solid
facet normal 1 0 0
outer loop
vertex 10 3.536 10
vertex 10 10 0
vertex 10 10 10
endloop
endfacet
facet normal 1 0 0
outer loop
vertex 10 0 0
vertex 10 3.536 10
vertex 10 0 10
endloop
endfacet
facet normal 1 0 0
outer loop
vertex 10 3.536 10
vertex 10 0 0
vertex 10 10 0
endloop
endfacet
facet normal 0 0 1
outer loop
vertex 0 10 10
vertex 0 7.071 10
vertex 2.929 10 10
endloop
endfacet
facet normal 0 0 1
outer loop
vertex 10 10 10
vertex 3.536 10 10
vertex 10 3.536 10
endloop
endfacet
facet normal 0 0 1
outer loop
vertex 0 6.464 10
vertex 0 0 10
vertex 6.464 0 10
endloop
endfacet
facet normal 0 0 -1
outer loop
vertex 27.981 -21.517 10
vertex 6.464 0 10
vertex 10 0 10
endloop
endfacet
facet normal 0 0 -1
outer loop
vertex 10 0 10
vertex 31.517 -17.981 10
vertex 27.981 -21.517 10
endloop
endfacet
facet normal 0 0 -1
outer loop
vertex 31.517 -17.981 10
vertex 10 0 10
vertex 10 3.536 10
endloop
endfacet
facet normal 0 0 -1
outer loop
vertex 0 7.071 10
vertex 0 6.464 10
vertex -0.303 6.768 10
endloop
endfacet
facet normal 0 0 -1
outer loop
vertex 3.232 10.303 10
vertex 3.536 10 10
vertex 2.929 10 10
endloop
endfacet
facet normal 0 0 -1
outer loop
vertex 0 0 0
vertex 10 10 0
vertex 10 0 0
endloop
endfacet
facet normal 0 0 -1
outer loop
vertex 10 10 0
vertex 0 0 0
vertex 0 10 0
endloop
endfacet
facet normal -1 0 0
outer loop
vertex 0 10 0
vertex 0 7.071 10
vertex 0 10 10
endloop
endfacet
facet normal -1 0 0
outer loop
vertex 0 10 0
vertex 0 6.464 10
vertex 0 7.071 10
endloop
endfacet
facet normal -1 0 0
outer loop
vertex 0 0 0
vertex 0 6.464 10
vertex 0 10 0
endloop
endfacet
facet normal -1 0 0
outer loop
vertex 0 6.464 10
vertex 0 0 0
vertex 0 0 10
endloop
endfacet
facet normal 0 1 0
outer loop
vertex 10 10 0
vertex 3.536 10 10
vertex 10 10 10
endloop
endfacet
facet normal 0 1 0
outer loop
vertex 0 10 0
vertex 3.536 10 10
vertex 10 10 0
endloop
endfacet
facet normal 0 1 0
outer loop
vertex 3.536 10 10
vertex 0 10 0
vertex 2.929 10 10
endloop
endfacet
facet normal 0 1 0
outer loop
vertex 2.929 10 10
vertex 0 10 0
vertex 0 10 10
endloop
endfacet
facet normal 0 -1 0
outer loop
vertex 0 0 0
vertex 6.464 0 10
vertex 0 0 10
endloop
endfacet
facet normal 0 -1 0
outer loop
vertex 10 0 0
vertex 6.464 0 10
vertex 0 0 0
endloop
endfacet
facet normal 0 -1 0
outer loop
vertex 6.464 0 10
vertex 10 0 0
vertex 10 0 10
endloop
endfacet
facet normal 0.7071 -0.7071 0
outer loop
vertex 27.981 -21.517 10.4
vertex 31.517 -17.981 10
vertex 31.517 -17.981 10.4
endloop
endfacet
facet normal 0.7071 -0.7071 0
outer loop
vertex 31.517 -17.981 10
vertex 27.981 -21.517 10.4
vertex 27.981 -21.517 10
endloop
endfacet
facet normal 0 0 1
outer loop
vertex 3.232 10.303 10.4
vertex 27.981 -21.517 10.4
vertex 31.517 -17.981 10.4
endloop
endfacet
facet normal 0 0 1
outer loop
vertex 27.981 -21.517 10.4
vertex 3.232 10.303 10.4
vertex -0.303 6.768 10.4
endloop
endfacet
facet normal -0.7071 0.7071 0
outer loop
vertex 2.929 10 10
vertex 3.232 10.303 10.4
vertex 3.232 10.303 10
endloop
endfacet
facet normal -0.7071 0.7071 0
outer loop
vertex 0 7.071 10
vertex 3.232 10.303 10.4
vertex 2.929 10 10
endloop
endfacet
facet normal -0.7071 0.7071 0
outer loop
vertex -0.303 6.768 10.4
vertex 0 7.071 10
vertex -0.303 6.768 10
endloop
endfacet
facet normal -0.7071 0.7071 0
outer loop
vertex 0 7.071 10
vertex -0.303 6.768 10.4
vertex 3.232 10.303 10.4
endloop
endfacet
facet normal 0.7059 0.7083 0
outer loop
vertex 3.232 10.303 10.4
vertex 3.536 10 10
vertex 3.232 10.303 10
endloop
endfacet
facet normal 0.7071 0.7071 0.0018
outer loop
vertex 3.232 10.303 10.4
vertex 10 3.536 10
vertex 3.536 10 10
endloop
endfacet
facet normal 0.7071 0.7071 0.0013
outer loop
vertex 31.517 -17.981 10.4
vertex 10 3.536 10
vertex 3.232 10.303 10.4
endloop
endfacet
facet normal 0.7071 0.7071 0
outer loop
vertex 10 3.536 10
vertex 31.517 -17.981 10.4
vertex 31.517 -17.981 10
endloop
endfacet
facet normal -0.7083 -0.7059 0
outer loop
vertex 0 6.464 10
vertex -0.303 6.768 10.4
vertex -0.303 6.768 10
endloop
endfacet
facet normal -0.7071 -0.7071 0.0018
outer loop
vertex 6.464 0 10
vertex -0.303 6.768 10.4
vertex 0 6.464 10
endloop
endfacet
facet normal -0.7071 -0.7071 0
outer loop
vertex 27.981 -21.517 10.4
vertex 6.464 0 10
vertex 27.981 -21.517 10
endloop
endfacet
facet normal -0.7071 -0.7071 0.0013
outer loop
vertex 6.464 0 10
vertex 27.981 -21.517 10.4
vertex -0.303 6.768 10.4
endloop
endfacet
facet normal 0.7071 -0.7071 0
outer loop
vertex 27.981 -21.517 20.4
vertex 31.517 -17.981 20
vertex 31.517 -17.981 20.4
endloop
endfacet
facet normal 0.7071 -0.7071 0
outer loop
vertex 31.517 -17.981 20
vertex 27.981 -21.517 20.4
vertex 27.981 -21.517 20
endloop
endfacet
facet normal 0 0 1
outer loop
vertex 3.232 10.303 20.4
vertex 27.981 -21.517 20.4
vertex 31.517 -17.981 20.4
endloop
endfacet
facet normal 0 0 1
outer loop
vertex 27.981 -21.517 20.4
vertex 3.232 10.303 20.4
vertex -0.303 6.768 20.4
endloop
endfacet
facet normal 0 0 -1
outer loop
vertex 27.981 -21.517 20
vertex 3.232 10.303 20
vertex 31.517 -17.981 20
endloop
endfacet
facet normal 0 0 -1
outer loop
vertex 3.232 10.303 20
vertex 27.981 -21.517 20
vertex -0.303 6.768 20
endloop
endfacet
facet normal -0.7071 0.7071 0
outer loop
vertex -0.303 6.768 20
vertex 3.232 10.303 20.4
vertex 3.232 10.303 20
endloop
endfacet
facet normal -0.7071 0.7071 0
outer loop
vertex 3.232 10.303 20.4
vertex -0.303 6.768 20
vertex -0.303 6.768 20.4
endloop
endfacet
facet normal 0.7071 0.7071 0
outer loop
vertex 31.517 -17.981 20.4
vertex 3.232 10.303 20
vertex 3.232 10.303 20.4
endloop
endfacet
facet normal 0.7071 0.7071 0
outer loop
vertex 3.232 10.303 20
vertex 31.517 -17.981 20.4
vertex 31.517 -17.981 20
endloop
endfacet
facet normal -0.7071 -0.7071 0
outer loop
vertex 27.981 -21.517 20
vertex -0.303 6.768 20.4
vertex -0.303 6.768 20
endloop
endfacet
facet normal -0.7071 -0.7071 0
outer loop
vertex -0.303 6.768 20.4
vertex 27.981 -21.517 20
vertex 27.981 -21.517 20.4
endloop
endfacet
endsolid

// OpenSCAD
// file: local.scad
/*
Copyright (c) 2013 Johannes Reinhardt <jreinhardt@ist-dein-freund.de>

Permission is hereby granted, free of charge, to any person obtaining a copy
of this software and associated documentation files (the "Software"), to deal
in the Software without restriction, including without limitation the rights
to use, copy, modify, merge, publish, distribute, sublicense, and/or sell
copies of the Software, and to permit persons to whom the Software is
furnished to do so, subject to the following conditions:

The above copyright notice and this permission notice shall be included in
all copies or substantial portions of the Software.

THE SOFTWARE IS PROVIDED "AS IS", WITHOUT WARRANTY OF ANY KIND, EXPRESS OR
IMPLIED, INCLUDING BUT NOT LIMITED TO THE WARRANTIES OF MERCHANTABILITY,
FITNESS FOR A PARTICULAR PURPOSE AND NONINFRINGEMENT. IN NO EVENT SHALL THE
AUTHORS OR COPYRIGHT HOLDERS BE LIABLE FOR ANY CLAIM, DAMAGES OR OTHER
LIABILITY, WHETHER IN AN ACTION OF CONTRACT, TORT OR OTHERWISE, ARISING FROM,
OUT OF OR IN CONNECTION WITH THE SOFTWARE OR THE USE OR OTHER DEALINGS IN
THE SOFTWARE.
*/

/*
local.scad local coordinate systems for OpenSCAD

for more information, see https://github.com/jreinhardt/local-scad
*/

//a few utility functions
function norm(a) = sqrt(a*a);
function unit_vector(v) = v/norm(v);
function clamp(v,lower_bound,upper_bound) = min(max(v,lower_bound),upper_bound);
function cross_product(a,b) = [
	a[1]*b[2]-a[2]*b[1],
	a[2]*b[0]-a[0]*b[2],
	a[0]*b[1]-a[1]*b[0]
];

//works for both numbers and vectors
function almost_equal(number, ref, tol) = sqrt((number-ref)*(number-ref)) < tol;

function _rotation_angle(a,b) = (a*b > 0) ? 
	asin(clamp(norm(cross_product(b,a))/norm(a)/norm(b),-1,1)) :
	180 - asin(clamp(norm(cross_product(b,a))/norm(a)/norm(b),-1,1));

//The (non-unit) rotation axis and angle around which a has to be rotated to be colinear to b
function calculate_rotation_axis(a,b) =
	//if the two vectors are not colinear find a rotation axis using the cross product
	(norm(cross_product(b,a)) != 0) ? [unit_vector(cross_product(b,a)),_rotation_angle(a,b)] :
	//if they are colinear and do not lie in the yz plane, choose the rotation axis from the yz plane
	(a*[1,0,0] < 0) ? [unit_vector([0,-a[1],+a[0]]),acos(clamp(a*b/norm(a)/norm(b),-1,1))] :
	(a*[1,0,0] > 0) ? [unit_vector([0,+a[1],-a[0]]),acos(clamp(a*b/norm(a)/norm(b),-1,1))] :
	//otherwise use the x axis
	[[1,0,0],acos(clamp(a*b/norm(a)/norm(b),-1,1))];

function calculate_axes(x,y) = [unit_vector(x),unit_vector(y), unit_vector(cross_product(x,y))];

function new_cs(origin=[0,0,0],axes=[[1,0,0],[0,1,0],[0,0,1]]) = (len(axes) == 2) ?
	[origin,calculate_axes(axes[0],axes[1])] :
	is_orthonormal([origin,axes]) ?
		[origin,axes] :
		"Error: Axes are not orthonormal";

function is_orthonormal(cs,tol=1e-3) =
	(almost_equal(norm(cs[1][0]),1,tol)) &&
	(almost_equal(norm(cs[1][1]),1,tol)) &&
	(almost_equal(norm(cs[1][2]),1,tol)) &&
	(almost_equal(cross_product(cs[1][0],cs[1][1]),cs[1][2],tol)) &&
	(almost_equal(cross_product(cs[1][1],cs[1][2]),cs[1][0],tol)) &&
	(almost_equal(cross_product(cs[1][2],cs[1][0]),cs[1][1],tol));

function unit_matrix3() = [
[1,0,0],
[0,1,0],
[0,0,1]];

function tensor_product_matrix3(u,v) = [
[u[0]*v[0], u[0]*v[1], u[0]*v[2]],
[u[1]*v[0], u[1]*v[1], u[1]*v[2]],
[u[2]*v[0], u[2]*v[1], u[2]*v[2]]];

function cross_product_matrix3(v) = [
[   0 , -v[2], +v[1]],
[+v[2],    0 , -v[0]],
[-v[1],  v[0],    0 ]];

function rotation_matrix3(n,angle) =
	cos(angle)*unit_matrix3() +
	sin(angle)*cross_product_matrix3(n) +
	(1-cos(angle))*tensor_product_matrix3(n,n);

//the modules are used directly by the user
module show_cs(cs){
	origin = cs[0];
	axes = cs[1];
	x_rot = calculate_rotation_axis(axes[0],[0,0,1]);
	y_rot = calculate_rotation_axis(axes[1],[0,0,1]);
	z_rot = calculate_rotation_axis(axes[2],[0,0,1]);
	translate(origin){
		color("Gray") sphere(0.2);
		rotate(x_rot[1],x_rot[0]) color("Red") cylinder(r=0.1,h=norm(axes[0]));
		rotate(y_rot[1],y_rot[0]) color("Green") cylinder(r=0.1,h=norm(axes[1]));
		rotate(z_rot[1],z_rot[0]) color("Blue") cylinder(r=0.1,h=norm(axes[2]));
	}
}

module translate_local(cs,v=[0,0,0]){
	origin = cs[0];
	axes = cs[1];
	x_rot = calculate_rotation_axis(axes[0],[1,0,0]);
	y_rot = calculate_rotation_axis(axes[1],
		rotation_matrix3(x_rot[0],x_rot[1])*[0,1,0]);
	translate(origin+v*axes){
		//align y axes
		rotate(y_rot[1],y_rot[0]){
			//align x axes
			rotate(x_rot[1],x_rot[0]){
				children(0);
			}
		}
	}
}

module in_cs(cs){
	origin = cs[0];
	axes = cs[1];
	x_rot = calculate_rotation_axis(axes[0],[1,0,0]);
	y_rot = calculate_rotation_axis(axes[1],
		rotation_matrix3(x_rot[0],x_rot[1])*[0,1,0]);
	translate(origin){
		//align y axes
		rotate(y_rot[1],y_rot[0]){
			//align x axes
			rotate(x_rot[1],x_rot[0]){
				children(0);
			}
		}
	}
}

module align(cs, cs_dst, displacement=[0,0,0]){
	x_rot = calculate_rotation_axis(cs[1][0],cs_dst[1][0]);
	y_rot = _rotation_angle(cs[1][1],
		rotation_matrix3(x_rot[0],x_rot[1])*cs_dst[1][1]);
	translate(cs_dst[0]+displacement*cs_dst[1])
		//align x axes
		rotate(-x_rot[1],x_rot[0])
				//align y axes
				rotate(-y_rot,cs[1][0])
				translate(-cs[0])
					children(0);
}
// main file
use <local.scad>

//make modularity simple
//coordinate systems are pretty close to the connectors from attach.scad:
//https://github.com/Obijuan/obiscad
//http://www.thingiverse.com/thing:30136
//so we can use them as such

//define bodies with corresponding coordinate systems to define attachment
//points
module cube1(){
	cube([10,10,10]);
}
cube1_1 = new_cs(origin=[5,5,10],axes=[[0,0,1],[1,0,0]]);

module arm(){
	cube([40,5,0.4]);
}

arm_1 = new_cs([5,2.5,0],axes=[[0,0,1],[1,1,0]]);

//cube1();
//show_cs(cube1_1);

//arm();
//show_cs(arm_1);

//align moves the child in such a way that the first coordinate system
//coincides with the second, and thereby attaches the arm to the cube
cube1();
align(arm_1,cube1_1) arm();


//one can also displace the arm by a certain vector in the connector coordinate
//system
align(arm_1,cube1_1,[10,0,0]) arm();
